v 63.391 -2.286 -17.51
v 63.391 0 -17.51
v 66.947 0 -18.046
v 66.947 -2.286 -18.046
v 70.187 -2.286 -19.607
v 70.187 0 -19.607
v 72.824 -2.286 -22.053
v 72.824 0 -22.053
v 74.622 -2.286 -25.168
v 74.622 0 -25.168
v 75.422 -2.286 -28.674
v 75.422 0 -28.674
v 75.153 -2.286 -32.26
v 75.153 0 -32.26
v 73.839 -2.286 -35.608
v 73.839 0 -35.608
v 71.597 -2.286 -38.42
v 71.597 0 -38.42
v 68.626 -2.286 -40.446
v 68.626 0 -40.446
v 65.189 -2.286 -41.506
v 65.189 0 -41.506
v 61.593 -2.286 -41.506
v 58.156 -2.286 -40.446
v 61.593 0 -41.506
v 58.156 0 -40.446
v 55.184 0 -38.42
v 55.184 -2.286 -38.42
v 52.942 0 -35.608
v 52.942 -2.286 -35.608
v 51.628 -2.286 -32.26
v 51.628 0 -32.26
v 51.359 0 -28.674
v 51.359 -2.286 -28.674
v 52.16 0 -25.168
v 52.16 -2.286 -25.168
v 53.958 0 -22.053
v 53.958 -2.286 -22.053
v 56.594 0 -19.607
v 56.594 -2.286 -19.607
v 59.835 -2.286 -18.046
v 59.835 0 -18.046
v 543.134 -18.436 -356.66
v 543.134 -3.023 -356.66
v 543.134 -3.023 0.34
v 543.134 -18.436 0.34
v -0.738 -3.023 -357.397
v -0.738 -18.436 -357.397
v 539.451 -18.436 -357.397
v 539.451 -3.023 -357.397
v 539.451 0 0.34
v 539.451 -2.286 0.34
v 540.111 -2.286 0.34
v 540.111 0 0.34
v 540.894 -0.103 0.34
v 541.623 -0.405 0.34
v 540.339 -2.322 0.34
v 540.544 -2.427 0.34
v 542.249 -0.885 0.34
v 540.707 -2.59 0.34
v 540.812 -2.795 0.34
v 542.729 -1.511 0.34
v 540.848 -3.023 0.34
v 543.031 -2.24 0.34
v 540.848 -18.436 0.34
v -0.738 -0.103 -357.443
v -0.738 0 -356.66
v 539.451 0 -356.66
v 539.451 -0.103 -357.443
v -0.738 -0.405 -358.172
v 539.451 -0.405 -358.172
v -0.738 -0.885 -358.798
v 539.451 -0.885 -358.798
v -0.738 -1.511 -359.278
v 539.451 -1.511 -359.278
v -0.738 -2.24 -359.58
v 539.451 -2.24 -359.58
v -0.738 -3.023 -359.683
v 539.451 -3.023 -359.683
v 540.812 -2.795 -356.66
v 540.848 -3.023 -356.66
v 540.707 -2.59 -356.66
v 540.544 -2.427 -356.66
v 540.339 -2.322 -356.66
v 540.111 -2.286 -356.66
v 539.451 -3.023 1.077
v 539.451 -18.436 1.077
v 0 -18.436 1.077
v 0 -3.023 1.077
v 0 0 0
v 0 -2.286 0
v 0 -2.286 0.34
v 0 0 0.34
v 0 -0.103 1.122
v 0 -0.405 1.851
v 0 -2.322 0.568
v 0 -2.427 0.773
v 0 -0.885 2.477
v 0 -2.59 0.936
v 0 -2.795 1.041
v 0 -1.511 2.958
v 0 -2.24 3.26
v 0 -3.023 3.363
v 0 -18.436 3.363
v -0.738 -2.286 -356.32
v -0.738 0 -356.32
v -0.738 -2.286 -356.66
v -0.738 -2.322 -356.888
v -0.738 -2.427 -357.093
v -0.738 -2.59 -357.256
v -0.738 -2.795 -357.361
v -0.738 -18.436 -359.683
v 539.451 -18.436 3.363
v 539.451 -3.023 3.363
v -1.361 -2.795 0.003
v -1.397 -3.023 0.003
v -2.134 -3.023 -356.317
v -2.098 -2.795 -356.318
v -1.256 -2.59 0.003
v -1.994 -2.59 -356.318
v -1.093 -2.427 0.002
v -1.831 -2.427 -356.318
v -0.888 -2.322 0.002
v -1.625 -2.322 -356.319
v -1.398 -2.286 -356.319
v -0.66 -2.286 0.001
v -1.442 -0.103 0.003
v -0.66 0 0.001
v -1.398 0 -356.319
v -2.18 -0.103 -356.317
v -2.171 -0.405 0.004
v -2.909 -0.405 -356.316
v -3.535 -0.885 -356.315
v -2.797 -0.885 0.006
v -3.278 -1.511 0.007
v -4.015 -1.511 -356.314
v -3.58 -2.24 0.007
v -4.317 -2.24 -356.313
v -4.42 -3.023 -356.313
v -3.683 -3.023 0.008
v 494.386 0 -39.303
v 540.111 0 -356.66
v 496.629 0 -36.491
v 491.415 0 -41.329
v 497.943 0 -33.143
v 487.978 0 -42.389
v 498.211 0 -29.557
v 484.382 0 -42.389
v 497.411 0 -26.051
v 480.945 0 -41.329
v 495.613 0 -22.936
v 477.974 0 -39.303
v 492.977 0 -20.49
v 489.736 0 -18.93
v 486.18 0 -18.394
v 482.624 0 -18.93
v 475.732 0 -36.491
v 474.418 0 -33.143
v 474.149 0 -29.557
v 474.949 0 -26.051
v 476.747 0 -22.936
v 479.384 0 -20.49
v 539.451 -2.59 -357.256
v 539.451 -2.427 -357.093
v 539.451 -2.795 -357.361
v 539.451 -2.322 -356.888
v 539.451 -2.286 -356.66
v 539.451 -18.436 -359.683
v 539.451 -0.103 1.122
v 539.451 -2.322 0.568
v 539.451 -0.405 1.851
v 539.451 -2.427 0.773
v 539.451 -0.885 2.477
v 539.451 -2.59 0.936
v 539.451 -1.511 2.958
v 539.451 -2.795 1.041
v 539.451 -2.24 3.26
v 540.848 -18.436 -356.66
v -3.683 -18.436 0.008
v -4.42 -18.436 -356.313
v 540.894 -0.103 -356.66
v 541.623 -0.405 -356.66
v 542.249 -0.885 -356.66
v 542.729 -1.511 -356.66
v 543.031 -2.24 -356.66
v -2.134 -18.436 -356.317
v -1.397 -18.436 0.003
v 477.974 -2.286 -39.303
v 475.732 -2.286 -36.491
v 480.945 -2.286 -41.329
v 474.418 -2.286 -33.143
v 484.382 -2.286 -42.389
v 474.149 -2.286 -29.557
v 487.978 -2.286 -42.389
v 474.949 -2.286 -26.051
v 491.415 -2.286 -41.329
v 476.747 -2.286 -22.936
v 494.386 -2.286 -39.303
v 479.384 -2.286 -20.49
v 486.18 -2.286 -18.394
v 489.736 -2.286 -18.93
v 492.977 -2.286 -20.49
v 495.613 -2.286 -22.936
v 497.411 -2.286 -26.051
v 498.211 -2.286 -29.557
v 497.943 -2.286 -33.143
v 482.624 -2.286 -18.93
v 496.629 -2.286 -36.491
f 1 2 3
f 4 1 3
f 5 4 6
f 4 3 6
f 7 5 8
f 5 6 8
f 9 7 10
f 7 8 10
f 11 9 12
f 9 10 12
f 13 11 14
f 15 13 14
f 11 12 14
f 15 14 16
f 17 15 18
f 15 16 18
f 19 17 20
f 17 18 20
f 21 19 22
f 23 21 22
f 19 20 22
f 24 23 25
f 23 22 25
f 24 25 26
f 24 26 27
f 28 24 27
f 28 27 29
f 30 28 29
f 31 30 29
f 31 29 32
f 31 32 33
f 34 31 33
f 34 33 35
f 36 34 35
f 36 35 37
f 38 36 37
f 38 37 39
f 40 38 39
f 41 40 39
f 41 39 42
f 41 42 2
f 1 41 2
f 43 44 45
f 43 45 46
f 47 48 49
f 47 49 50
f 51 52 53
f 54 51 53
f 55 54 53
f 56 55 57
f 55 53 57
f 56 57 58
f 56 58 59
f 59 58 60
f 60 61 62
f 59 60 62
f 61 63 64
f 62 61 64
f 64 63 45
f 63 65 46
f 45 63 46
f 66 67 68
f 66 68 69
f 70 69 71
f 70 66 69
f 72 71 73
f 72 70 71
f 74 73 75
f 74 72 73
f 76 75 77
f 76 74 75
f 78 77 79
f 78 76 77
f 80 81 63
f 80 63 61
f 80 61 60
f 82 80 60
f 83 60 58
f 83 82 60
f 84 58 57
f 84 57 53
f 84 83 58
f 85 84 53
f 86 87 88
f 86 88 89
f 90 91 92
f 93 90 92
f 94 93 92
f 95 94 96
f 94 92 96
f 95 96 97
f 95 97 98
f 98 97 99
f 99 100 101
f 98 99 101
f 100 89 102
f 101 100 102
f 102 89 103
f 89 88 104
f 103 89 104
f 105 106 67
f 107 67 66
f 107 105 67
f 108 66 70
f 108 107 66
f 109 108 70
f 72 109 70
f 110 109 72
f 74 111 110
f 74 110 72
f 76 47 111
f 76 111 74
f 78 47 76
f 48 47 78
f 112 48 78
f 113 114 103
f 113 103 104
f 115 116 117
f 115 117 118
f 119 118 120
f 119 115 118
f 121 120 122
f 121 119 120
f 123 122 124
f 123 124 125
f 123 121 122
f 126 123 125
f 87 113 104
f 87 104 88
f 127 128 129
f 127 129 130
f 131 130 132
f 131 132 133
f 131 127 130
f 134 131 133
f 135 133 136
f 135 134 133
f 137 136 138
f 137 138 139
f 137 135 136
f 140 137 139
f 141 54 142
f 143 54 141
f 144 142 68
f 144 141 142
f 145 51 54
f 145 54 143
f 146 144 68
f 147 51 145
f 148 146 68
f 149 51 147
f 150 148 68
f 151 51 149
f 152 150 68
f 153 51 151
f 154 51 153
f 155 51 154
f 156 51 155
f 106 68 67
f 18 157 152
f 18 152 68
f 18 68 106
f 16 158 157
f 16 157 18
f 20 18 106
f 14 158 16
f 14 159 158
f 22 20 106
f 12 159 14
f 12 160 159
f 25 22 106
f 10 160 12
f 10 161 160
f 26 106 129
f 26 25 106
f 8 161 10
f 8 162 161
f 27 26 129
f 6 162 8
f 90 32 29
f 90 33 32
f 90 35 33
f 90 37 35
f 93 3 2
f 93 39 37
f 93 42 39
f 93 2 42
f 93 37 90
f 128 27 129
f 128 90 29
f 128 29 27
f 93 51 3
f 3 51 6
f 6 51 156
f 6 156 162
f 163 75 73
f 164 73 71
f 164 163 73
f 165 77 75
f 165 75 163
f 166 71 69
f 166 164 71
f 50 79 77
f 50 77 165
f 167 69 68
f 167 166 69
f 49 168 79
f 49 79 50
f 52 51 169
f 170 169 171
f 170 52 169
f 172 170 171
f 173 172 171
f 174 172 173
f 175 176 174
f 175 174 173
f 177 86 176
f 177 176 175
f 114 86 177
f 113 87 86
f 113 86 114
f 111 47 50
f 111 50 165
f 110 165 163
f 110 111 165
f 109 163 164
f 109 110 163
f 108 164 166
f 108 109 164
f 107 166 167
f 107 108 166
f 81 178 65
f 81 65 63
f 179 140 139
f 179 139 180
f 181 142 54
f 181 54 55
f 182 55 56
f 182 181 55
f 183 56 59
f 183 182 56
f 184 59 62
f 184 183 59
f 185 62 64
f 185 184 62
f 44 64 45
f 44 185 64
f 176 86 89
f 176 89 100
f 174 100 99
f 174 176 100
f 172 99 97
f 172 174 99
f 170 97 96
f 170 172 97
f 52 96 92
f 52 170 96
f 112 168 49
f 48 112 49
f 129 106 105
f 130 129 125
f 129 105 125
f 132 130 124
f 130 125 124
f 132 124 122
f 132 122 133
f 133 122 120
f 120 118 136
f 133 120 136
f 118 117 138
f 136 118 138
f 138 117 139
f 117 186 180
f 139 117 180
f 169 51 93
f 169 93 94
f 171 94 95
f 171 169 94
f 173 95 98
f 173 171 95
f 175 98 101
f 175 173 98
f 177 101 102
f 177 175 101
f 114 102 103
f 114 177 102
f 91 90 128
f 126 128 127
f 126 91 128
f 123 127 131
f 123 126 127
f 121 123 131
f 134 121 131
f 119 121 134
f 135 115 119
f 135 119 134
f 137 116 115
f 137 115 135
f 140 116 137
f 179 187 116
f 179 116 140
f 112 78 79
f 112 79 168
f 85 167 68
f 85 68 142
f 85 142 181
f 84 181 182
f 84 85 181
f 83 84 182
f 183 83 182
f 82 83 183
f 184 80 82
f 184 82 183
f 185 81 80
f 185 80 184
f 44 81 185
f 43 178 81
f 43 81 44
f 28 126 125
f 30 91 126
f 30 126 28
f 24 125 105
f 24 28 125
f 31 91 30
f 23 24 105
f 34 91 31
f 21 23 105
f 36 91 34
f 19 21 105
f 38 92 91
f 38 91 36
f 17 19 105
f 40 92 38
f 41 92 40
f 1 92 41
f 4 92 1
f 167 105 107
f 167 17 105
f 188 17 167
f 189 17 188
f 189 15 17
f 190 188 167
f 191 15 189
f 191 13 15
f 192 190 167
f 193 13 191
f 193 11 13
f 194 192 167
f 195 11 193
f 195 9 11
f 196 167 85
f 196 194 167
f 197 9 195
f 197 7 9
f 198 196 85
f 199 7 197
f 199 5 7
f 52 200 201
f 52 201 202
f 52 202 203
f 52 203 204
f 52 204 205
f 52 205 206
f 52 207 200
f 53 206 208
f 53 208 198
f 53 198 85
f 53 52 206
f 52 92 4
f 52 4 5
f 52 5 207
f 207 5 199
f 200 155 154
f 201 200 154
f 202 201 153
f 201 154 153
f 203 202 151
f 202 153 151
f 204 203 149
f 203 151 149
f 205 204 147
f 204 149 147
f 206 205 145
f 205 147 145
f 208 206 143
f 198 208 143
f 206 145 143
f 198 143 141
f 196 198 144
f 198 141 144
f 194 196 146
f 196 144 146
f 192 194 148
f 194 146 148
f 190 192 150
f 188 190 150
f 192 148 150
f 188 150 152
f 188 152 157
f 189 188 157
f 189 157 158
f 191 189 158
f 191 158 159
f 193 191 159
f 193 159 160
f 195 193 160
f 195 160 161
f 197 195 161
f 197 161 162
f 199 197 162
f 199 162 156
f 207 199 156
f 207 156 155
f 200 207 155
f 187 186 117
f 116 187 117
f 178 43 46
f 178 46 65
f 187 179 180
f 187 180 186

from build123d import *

# Parameters (mm, degrees)
BASE_FLANGE1_DEPTH       = 2.286
EDGE_FLANGE17_DEPTH      = 540.189115874
EDGE_FLANGE17_BEND_DEPTH = 539.451478538
EDGE_FLANGE18_DEPTH      = 357.000345524
EDGE_FLANGE18_BEND_DEPTH = 356.321109034
SKETCH197_R              = 12.065
CUT_EXTRUDE1_DEPTH       = 652.69497057


# Sheet-metal steps are written as plain solids
with BuildPart() as part:
    # Sketch1 → Base-Flange1 (new body)
    with BuildSketch(Plane(origin=(0, 0, 0), x_dir=(1, 0, 0), z_dir=(0, 1, 0))):
        Polygon((539.451478538, 356.320345524), (0, 356.320345524), (-0.737637336, 356.320345524), (0, 0), (539.451478538, 0), align=None)
    extrude(amount=-BASE_FLANGE1_DEPTH)

    # Edge-Flange17 section (across the edge) → Edge-Flange17 (add)
    with BuildSketch(Plane(origin=(-0.737637336, -2.286, -357.396945524), x_dir=(0, 0, 1), z_dir=(1, 0, 0))):
        with BuildLine():
            Line((-2.286, 0.7366), (-2.286, 16.15))
            Line((-2.286, 16.15), (0, 16.15))
            Line((0, 16.15), (0, 0.7366))
            ThreePointArc((0, 0.7366), (0.215745145, 0.215745145), (0.7366, 0))
            Line((0.7366, 0), (1.0766, 0))
            Line((1.0766, 0), (1.0766, -2.286))
            Line((1.0766, -2.286), (0.7366, -2.286))
            ThreePointArc((0.7366, -2.286), (-1.400700957, -1.400700957), (-2.286, 0.7366))
        make_face()
    extrude(amount=EDGE_FLANGE17_DEPTH)

    # Edge-Flange17 section 2 (across the edge) → Edge-Flange17 bend (add)
    with BuildSketch(Plane(origin=(539.451478538, -2.286, 1.0766), x_dir=(0, 0, -1), z_dir=(-1, 0, 0))):
        with BuildLine():
            Line((-2.286, 0.7366), (-2.286, 16.15))
            Line((-2.286, 16.15), (0, 16.15))
            Line((0, 16.15), (0, 0.7366))
            ThreePointArc((0, 0.7366), (0.215745145, 0.215745145), (0.7366, 0))
            Line((0.7366, 0), (1.0766, 0))
            Line((1.0766, 0), (1.0766, -2.286))
            Line((1.0766, -2.286), (0.7366, -2.286))
            ThreePointArc((0.7366, -2.286), (-1.400700957, -1.400700957), (-2.286, 0.7366))
        make_face()
    extrude(amount=EDGE_FLANGE17_BEND_DEPTH)

    # Edge-Flange18 section (across the edge) → Edge-Flange18 (add)
    with BuildSketch(Plane(origin=(540.848078538, -2.286, -356.660345524), x_dir=(-1, 0, 0), z_dir=(0, 0, 1))):
        with BuildLine():
            Line((-2.286, 0.7366), (-2.286, 16.15))
            Line((-2.286, 16.15), (0, 16.15))
            Line((0, 16.15), (0, 0.7366))
            ThreePointArc((0, 0.7366), (0.215745145, 0.215745145), (0.7366, 0))
            Line((0.7366, 0), (1.3966, 0))
            Line((1.3966, 0), (1.3966, -2.286))
            Line((1.3966, -2.286), (0.7366, -2.286))
            ThreePointArc((0.7366, -2.286), (-1.400700957, -1.400700957), (-2.286, 0.7366))
        make_face()
    extrude(amount=EDGE_FLANGE18_DEPTH)

    # Edge-Flange18 section 2 (across the edge) → Edge-Flange18 bend (add)
    with BuildSketch(Plane(origin=(-1.396597007, -2.286, 0.002891168), x_dir=(0.9999978572418866, -3.4914813388431337e-15, -0.0020701477327567633), z_dir=(-0.0020701477327567633, 0, -0.9999978572418866))):
        with BuildLine():
            Line((-2.286, 0.7366), (-2.286, 16.15))
            Line((-2.286, 16.15), (0, 16.15))
            Line((0, 16.15), (0, 0.7366))
            ThreePointArc((0, 0.7366), (0.215745145, 0.215745145), (0.7366, 0))
            Line((0.7366, 0), (1.3966, 0))
            Line((1.3966, 0), (1.3966, -2.286))
            Line((1.3966, -2.286), (0.7366, -2.286))
            ThreePointArc((0.7366, -2.286), (-1.400700957, -1.400700957), (-2.286, 0.7366))
        make_face()
    extrude(amount=EDGE_FLANGE18_BEND_DEPTH)

    # Sketch197 → Cut-Extrude1 (cut, through all)
    with BuildSketch(Plane(origin=(0, 0, 0), x_dir=(1, 0, 0), z_dir=(0, 1, 0))):
        with Locations(Location((486.180210266, 30.458714935, 0), (0, 0, 270))):
            Circle(SKETCH197_R)
        with Locations(Location((63.390735832, 29.575349793, 0), (0, 0, 270))):
            Circle(SKETCH197_R)
    extrude(amount=-CUT_EXTRUDE1_DEPTH, mode=Mode.SUBTRACT)


solid = part.part
